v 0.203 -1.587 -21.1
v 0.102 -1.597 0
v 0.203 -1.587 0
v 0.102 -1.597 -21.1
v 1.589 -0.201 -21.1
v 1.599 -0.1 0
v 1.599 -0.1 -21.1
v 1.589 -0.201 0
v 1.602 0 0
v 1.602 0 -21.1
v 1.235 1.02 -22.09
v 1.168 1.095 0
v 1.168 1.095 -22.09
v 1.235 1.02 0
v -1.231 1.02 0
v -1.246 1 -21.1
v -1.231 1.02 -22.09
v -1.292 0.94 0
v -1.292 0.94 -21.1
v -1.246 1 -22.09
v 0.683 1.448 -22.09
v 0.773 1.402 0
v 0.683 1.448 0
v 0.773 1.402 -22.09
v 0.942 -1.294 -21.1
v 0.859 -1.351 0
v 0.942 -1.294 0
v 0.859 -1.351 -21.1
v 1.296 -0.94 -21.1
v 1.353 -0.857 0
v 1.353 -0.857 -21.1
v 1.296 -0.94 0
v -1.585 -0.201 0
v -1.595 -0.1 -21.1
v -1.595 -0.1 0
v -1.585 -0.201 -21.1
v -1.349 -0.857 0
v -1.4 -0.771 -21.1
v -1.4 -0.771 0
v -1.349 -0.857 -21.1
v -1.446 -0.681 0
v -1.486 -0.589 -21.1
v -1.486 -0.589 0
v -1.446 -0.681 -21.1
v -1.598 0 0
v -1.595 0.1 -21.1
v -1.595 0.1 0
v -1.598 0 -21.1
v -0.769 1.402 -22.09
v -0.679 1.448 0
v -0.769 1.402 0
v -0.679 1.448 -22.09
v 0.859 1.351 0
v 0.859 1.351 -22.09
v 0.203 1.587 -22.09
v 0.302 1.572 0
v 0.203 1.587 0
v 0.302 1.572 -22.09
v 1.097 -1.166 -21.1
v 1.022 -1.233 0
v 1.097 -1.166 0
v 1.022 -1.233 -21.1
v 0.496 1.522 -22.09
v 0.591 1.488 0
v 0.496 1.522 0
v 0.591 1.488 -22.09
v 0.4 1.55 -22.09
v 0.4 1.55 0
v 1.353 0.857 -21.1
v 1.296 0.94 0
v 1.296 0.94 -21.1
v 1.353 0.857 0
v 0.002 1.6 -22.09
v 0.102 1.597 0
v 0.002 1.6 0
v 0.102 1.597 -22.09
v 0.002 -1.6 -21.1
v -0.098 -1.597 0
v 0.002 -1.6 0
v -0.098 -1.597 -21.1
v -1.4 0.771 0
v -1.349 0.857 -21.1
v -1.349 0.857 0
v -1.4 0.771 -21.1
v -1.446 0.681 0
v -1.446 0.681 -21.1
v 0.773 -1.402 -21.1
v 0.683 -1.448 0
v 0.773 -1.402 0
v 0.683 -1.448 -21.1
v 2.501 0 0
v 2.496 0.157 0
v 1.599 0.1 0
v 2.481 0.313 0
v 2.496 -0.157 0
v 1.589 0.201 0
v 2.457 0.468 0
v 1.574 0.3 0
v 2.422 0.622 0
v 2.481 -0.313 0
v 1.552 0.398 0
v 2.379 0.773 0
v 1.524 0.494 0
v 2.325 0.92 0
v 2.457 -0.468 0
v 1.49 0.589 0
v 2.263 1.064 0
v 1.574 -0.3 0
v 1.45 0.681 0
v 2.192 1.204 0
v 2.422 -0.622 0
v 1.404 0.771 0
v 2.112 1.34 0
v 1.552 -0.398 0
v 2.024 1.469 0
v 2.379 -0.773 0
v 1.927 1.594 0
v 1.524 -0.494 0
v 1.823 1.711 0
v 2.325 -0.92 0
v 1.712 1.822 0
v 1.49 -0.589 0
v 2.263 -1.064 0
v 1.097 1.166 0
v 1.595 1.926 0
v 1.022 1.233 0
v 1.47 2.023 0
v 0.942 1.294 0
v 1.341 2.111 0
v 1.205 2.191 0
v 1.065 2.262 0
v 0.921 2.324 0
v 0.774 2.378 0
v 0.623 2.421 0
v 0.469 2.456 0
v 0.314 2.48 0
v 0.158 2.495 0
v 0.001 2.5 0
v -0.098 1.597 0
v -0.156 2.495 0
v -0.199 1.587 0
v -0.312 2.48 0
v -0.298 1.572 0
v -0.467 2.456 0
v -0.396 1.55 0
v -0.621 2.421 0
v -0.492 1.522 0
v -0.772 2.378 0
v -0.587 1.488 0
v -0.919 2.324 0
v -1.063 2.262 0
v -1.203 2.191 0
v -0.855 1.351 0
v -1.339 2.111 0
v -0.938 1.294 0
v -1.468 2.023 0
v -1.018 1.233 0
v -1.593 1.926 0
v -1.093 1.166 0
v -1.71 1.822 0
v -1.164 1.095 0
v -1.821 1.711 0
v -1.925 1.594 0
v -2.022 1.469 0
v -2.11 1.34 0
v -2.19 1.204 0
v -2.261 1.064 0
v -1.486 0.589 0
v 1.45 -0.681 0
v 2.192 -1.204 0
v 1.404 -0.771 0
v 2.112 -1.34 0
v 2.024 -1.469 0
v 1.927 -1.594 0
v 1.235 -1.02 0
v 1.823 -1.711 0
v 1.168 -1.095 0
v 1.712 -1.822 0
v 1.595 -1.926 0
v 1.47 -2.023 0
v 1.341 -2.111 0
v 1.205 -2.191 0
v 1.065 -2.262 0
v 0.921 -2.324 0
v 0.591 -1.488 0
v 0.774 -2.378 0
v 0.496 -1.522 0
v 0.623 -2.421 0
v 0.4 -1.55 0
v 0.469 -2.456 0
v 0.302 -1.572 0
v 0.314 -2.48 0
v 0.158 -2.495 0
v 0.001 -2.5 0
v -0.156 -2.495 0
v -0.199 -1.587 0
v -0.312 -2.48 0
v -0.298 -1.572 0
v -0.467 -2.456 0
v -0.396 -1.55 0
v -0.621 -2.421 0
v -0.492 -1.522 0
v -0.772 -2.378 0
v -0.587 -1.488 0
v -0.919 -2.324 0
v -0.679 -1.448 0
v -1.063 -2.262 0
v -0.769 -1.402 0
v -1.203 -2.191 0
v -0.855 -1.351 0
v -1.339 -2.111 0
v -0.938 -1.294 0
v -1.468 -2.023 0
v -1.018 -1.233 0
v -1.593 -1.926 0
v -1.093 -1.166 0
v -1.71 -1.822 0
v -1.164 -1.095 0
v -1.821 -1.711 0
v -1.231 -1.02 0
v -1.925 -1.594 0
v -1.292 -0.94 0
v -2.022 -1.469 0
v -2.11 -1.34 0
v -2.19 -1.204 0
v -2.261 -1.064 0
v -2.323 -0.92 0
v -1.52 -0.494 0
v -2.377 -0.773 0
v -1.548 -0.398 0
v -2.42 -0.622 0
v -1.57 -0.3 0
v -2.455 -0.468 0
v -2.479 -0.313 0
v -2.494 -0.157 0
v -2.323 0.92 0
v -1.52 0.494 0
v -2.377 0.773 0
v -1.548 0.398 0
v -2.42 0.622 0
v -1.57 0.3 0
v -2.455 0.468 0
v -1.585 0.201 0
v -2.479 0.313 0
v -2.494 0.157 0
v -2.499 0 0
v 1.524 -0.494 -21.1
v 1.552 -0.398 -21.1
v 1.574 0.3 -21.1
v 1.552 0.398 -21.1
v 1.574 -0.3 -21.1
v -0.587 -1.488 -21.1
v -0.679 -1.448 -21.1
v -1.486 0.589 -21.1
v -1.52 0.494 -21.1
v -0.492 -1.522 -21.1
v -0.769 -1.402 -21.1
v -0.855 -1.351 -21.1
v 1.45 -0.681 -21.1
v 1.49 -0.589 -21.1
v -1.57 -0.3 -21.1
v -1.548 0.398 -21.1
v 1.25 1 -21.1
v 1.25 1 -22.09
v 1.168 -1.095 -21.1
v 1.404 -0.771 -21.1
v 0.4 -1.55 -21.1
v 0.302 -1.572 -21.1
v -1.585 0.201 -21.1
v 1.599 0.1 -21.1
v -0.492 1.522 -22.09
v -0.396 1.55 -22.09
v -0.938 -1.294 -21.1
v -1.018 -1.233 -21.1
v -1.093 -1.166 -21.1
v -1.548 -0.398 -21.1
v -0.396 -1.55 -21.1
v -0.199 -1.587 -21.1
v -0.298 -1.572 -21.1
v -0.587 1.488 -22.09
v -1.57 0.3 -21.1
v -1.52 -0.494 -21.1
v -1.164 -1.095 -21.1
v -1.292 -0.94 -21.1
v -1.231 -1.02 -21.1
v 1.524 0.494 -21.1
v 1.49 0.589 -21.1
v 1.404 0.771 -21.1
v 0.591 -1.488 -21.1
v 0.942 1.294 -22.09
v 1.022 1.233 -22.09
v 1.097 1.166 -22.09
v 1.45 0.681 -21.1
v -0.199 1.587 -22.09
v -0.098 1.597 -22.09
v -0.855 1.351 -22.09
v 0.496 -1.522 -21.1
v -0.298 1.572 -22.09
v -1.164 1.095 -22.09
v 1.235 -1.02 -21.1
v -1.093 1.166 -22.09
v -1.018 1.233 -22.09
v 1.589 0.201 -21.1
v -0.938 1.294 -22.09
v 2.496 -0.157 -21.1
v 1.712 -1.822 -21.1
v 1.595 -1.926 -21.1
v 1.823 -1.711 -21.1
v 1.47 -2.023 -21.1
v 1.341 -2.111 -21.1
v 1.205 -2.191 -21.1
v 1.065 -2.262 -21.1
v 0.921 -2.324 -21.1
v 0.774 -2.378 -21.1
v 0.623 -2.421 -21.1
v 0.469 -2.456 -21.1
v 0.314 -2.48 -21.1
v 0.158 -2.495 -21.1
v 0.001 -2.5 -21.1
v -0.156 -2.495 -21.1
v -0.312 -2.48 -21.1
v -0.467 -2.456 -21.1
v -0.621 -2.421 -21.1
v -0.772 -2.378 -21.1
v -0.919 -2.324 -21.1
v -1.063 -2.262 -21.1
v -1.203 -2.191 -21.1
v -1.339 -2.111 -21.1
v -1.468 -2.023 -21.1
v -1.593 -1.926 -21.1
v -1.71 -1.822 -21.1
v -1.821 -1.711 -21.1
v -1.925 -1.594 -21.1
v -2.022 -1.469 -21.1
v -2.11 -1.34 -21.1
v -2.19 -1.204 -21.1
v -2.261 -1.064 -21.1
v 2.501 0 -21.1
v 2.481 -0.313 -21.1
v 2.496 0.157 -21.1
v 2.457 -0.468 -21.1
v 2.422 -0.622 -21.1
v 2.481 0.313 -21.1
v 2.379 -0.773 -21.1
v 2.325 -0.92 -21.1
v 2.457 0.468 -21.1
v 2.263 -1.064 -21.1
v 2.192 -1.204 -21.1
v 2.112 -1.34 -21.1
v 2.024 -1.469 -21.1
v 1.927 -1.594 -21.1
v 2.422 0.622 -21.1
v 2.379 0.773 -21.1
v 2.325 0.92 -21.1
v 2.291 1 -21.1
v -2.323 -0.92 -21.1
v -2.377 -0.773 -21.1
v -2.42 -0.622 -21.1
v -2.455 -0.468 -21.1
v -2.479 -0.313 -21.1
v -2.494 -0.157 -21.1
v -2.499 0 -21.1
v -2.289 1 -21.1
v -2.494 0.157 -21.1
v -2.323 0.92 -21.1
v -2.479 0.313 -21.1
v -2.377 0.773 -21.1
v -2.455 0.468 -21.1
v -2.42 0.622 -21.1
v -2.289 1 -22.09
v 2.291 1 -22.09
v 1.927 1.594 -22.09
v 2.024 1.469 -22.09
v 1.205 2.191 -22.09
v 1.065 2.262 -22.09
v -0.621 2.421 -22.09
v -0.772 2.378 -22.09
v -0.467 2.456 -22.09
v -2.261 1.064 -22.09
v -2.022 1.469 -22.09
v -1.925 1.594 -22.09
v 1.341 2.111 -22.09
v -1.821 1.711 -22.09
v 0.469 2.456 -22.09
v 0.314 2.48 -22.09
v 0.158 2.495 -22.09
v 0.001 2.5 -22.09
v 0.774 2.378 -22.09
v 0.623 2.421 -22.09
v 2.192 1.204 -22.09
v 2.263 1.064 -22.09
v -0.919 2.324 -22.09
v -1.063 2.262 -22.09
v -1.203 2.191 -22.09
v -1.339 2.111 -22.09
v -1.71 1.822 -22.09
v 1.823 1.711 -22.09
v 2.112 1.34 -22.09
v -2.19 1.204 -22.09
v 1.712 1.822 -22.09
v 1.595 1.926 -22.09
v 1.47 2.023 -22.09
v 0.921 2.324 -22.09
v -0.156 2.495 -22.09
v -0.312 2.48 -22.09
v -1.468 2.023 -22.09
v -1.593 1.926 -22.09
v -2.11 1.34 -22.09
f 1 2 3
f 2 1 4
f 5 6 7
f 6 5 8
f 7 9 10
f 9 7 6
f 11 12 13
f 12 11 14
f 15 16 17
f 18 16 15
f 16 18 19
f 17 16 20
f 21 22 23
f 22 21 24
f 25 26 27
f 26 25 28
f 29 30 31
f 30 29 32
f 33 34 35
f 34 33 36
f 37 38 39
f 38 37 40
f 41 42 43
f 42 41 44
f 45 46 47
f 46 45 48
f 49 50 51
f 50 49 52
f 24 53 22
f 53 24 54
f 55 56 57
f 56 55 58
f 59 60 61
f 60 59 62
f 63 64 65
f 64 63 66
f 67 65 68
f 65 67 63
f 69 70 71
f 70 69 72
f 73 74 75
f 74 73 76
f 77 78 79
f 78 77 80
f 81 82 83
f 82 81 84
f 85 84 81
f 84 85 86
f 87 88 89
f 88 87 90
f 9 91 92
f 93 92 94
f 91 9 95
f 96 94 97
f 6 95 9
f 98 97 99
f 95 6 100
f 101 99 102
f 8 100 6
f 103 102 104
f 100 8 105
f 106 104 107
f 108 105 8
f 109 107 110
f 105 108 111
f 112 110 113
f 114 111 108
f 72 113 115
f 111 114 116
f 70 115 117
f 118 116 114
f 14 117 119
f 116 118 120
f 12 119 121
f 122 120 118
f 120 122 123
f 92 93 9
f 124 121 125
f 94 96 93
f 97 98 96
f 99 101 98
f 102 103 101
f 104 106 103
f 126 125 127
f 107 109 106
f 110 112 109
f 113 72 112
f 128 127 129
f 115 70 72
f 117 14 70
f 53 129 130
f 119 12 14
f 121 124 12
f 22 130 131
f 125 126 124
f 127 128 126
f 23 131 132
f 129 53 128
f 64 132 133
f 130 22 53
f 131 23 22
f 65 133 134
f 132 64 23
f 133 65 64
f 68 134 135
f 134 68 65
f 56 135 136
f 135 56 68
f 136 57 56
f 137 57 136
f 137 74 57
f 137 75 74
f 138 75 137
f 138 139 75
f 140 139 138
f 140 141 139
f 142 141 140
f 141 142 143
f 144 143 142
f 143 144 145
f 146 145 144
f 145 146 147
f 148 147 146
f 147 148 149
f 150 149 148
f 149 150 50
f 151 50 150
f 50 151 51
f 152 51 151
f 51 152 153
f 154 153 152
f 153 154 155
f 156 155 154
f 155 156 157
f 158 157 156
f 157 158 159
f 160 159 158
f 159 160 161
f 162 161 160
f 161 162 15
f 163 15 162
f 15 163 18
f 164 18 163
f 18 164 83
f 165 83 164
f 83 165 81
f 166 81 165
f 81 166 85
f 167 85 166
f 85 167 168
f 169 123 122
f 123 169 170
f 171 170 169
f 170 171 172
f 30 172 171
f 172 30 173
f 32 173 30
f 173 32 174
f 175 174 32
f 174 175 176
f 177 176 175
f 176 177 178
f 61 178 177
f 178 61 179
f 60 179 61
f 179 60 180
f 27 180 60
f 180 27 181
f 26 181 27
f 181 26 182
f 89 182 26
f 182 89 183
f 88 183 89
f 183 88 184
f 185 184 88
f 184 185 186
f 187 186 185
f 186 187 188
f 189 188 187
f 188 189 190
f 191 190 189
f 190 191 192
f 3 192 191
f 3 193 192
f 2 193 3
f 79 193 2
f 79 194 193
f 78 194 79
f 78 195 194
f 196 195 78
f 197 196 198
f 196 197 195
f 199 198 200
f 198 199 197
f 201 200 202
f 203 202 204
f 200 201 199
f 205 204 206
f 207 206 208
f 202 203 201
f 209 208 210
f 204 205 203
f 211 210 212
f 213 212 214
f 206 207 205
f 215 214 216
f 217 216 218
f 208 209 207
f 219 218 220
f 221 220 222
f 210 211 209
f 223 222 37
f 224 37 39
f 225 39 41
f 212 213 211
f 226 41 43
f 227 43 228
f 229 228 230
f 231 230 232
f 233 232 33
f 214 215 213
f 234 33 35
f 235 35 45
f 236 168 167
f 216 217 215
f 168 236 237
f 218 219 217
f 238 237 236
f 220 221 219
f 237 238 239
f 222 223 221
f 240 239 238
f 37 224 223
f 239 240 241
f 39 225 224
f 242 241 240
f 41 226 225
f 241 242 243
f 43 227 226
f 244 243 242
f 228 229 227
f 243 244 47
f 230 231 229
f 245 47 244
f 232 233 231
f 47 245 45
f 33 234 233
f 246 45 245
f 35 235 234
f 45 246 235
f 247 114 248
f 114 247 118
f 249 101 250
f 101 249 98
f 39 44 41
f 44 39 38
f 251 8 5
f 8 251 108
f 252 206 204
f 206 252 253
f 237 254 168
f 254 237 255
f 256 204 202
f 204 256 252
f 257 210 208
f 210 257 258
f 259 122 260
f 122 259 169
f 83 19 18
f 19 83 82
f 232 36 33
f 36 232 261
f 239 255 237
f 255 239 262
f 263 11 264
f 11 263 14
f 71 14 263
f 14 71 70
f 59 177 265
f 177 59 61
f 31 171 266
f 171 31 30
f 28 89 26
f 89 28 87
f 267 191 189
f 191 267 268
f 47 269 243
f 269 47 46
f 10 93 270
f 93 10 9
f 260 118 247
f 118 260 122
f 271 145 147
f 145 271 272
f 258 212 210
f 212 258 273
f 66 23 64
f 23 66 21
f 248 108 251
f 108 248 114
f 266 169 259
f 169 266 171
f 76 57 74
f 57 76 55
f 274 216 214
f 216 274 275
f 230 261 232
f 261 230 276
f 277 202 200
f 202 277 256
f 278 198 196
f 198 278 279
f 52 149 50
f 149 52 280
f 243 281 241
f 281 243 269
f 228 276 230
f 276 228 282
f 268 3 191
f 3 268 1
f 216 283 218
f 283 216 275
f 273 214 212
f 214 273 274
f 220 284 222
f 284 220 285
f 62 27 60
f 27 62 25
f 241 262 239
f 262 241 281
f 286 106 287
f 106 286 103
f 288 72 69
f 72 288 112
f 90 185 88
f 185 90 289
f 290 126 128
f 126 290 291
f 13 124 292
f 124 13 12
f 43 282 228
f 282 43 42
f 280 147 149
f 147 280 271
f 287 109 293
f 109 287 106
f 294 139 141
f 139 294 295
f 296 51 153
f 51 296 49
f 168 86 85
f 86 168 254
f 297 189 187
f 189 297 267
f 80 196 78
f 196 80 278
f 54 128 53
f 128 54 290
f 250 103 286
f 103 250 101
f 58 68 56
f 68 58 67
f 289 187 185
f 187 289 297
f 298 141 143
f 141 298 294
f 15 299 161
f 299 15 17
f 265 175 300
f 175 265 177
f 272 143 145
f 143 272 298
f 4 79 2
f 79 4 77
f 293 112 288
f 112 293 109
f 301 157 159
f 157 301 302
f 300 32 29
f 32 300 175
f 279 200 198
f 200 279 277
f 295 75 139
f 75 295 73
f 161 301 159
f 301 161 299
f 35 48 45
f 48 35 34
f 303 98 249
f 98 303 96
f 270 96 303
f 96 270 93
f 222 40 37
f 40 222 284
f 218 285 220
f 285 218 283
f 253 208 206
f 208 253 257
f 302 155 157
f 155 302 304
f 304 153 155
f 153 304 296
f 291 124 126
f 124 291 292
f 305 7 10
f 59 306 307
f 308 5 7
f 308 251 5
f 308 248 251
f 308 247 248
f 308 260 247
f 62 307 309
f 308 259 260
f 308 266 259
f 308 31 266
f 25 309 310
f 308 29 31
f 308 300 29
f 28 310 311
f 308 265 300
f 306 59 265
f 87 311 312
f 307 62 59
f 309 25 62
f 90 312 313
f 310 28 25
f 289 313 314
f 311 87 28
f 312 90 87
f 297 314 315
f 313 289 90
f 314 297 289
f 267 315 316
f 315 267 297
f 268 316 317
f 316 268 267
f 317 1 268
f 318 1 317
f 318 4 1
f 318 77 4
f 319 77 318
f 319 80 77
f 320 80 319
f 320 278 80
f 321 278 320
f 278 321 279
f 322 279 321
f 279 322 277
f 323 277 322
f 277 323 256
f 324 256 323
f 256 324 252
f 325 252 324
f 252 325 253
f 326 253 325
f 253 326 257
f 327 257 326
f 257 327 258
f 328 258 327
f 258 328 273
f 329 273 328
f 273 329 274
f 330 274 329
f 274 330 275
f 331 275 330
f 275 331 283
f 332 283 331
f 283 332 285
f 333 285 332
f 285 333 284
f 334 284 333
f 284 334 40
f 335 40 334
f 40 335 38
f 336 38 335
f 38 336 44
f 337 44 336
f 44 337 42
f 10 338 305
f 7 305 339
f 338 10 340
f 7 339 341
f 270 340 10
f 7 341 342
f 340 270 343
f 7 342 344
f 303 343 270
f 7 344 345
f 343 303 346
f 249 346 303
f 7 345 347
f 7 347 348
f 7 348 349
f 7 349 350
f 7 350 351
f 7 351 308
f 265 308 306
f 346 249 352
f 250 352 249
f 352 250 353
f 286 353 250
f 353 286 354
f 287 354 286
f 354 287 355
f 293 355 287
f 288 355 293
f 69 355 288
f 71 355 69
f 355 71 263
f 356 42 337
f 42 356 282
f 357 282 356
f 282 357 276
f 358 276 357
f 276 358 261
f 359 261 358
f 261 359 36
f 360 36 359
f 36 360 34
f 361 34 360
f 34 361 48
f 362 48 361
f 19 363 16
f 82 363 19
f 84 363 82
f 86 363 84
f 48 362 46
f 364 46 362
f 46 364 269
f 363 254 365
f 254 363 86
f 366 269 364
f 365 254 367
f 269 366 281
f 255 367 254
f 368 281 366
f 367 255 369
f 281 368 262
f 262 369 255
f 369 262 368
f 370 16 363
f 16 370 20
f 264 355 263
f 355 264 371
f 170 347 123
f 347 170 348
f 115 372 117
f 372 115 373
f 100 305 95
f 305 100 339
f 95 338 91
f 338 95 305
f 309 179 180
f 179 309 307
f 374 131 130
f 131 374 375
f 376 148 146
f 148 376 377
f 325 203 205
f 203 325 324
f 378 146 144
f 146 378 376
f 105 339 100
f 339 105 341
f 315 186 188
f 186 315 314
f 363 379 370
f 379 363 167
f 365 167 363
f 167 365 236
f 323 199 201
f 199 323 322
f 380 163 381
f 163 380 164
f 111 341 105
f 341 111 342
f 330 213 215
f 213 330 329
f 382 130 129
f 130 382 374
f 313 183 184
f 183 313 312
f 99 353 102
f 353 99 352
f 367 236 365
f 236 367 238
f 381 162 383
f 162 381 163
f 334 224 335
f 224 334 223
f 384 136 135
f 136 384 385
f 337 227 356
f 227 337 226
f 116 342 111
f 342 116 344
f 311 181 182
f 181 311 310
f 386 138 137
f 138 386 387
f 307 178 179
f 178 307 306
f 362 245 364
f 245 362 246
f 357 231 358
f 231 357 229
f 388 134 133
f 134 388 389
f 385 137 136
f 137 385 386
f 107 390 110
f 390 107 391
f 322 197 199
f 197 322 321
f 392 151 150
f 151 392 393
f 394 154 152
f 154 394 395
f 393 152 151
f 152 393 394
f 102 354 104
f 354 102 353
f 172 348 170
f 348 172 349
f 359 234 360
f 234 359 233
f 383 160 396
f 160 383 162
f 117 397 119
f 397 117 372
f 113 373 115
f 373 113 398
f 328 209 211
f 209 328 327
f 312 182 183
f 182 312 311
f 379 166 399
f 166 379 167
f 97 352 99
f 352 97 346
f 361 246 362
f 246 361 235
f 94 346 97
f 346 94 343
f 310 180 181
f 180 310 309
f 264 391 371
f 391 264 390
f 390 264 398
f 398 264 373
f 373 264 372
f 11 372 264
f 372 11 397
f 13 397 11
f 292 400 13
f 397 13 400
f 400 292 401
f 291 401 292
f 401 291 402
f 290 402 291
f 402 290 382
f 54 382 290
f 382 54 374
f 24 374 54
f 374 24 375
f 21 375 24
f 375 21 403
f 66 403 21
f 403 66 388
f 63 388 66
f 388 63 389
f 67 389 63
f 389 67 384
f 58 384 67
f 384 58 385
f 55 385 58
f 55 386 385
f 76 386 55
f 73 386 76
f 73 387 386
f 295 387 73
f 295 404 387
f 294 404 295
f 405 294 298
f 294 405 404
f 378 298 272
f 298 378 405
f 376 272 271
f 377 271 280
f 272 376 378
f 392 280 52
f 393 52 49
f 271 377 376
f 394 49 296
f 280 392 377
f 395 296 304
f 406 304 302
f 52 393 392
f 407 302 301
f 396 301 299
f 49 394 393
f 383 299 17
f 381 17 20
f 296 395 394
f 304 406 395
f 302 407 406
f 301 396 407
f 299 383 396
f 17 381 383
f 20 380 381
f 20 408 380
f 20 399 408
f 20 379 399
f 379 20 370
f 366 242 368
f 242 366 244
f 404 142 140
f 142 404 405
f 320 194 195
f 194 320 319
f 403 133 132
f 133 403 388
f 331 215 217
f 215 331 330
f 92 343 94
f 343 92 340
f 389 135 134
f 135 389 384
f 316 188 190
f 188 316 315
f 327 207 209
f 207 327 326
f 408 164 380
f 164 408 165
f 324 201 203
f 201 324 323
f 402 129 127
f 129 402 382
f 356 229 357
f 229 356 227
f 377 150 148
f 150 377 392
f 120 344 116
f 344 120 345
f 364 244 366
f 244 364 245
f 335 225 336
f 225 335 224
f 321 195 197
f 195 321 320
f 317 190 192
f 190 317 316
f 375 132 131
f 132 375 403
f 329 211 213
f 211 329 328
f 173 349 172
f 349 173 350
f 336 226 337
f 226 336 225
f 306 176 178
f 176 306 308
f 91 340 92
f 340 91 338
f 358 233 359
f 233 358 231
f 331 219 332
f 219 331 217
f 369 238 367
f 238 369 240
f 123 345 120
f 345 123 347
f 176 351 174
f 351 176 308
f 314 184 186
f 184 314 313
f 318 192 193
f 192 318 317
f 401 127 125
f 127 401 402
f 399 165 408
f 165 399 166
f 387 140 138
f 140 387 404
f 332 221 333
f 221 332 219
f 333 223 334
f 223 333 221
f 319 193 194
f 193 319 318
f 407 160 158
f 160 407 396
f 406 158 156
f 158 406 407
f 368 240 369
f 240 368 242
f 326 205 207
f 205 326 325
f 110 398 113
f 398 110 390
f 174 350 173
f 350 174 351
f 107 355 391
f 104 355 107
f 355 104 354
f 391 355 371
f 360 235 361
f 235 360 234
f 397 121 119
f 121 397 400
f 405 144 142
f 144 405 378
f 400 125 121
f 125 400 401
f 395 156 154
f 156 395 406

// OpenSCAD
difference(){
    union(){
        //roue
        rotate_extrude($fn=200) 
            import (file="all.dxf", layer="0", $fn=100);
        //axe
        translate([0.001,0,0])
            rotate([180,00,0])
                //out of range to make a hook h should be 20.08
                cylinder(r=2.5,h=22.09,$fn=100);
    }
    union(){
        //inner axis
       translate([0.002,0,0])
          rotate([180,00,0])
            cylinder(r=1.6,h=23.11,$fn=100);
        //cut it to make a plug
        translate([-4,-3,-23.1])
            cube([10,4,2]);
           
    }
}
